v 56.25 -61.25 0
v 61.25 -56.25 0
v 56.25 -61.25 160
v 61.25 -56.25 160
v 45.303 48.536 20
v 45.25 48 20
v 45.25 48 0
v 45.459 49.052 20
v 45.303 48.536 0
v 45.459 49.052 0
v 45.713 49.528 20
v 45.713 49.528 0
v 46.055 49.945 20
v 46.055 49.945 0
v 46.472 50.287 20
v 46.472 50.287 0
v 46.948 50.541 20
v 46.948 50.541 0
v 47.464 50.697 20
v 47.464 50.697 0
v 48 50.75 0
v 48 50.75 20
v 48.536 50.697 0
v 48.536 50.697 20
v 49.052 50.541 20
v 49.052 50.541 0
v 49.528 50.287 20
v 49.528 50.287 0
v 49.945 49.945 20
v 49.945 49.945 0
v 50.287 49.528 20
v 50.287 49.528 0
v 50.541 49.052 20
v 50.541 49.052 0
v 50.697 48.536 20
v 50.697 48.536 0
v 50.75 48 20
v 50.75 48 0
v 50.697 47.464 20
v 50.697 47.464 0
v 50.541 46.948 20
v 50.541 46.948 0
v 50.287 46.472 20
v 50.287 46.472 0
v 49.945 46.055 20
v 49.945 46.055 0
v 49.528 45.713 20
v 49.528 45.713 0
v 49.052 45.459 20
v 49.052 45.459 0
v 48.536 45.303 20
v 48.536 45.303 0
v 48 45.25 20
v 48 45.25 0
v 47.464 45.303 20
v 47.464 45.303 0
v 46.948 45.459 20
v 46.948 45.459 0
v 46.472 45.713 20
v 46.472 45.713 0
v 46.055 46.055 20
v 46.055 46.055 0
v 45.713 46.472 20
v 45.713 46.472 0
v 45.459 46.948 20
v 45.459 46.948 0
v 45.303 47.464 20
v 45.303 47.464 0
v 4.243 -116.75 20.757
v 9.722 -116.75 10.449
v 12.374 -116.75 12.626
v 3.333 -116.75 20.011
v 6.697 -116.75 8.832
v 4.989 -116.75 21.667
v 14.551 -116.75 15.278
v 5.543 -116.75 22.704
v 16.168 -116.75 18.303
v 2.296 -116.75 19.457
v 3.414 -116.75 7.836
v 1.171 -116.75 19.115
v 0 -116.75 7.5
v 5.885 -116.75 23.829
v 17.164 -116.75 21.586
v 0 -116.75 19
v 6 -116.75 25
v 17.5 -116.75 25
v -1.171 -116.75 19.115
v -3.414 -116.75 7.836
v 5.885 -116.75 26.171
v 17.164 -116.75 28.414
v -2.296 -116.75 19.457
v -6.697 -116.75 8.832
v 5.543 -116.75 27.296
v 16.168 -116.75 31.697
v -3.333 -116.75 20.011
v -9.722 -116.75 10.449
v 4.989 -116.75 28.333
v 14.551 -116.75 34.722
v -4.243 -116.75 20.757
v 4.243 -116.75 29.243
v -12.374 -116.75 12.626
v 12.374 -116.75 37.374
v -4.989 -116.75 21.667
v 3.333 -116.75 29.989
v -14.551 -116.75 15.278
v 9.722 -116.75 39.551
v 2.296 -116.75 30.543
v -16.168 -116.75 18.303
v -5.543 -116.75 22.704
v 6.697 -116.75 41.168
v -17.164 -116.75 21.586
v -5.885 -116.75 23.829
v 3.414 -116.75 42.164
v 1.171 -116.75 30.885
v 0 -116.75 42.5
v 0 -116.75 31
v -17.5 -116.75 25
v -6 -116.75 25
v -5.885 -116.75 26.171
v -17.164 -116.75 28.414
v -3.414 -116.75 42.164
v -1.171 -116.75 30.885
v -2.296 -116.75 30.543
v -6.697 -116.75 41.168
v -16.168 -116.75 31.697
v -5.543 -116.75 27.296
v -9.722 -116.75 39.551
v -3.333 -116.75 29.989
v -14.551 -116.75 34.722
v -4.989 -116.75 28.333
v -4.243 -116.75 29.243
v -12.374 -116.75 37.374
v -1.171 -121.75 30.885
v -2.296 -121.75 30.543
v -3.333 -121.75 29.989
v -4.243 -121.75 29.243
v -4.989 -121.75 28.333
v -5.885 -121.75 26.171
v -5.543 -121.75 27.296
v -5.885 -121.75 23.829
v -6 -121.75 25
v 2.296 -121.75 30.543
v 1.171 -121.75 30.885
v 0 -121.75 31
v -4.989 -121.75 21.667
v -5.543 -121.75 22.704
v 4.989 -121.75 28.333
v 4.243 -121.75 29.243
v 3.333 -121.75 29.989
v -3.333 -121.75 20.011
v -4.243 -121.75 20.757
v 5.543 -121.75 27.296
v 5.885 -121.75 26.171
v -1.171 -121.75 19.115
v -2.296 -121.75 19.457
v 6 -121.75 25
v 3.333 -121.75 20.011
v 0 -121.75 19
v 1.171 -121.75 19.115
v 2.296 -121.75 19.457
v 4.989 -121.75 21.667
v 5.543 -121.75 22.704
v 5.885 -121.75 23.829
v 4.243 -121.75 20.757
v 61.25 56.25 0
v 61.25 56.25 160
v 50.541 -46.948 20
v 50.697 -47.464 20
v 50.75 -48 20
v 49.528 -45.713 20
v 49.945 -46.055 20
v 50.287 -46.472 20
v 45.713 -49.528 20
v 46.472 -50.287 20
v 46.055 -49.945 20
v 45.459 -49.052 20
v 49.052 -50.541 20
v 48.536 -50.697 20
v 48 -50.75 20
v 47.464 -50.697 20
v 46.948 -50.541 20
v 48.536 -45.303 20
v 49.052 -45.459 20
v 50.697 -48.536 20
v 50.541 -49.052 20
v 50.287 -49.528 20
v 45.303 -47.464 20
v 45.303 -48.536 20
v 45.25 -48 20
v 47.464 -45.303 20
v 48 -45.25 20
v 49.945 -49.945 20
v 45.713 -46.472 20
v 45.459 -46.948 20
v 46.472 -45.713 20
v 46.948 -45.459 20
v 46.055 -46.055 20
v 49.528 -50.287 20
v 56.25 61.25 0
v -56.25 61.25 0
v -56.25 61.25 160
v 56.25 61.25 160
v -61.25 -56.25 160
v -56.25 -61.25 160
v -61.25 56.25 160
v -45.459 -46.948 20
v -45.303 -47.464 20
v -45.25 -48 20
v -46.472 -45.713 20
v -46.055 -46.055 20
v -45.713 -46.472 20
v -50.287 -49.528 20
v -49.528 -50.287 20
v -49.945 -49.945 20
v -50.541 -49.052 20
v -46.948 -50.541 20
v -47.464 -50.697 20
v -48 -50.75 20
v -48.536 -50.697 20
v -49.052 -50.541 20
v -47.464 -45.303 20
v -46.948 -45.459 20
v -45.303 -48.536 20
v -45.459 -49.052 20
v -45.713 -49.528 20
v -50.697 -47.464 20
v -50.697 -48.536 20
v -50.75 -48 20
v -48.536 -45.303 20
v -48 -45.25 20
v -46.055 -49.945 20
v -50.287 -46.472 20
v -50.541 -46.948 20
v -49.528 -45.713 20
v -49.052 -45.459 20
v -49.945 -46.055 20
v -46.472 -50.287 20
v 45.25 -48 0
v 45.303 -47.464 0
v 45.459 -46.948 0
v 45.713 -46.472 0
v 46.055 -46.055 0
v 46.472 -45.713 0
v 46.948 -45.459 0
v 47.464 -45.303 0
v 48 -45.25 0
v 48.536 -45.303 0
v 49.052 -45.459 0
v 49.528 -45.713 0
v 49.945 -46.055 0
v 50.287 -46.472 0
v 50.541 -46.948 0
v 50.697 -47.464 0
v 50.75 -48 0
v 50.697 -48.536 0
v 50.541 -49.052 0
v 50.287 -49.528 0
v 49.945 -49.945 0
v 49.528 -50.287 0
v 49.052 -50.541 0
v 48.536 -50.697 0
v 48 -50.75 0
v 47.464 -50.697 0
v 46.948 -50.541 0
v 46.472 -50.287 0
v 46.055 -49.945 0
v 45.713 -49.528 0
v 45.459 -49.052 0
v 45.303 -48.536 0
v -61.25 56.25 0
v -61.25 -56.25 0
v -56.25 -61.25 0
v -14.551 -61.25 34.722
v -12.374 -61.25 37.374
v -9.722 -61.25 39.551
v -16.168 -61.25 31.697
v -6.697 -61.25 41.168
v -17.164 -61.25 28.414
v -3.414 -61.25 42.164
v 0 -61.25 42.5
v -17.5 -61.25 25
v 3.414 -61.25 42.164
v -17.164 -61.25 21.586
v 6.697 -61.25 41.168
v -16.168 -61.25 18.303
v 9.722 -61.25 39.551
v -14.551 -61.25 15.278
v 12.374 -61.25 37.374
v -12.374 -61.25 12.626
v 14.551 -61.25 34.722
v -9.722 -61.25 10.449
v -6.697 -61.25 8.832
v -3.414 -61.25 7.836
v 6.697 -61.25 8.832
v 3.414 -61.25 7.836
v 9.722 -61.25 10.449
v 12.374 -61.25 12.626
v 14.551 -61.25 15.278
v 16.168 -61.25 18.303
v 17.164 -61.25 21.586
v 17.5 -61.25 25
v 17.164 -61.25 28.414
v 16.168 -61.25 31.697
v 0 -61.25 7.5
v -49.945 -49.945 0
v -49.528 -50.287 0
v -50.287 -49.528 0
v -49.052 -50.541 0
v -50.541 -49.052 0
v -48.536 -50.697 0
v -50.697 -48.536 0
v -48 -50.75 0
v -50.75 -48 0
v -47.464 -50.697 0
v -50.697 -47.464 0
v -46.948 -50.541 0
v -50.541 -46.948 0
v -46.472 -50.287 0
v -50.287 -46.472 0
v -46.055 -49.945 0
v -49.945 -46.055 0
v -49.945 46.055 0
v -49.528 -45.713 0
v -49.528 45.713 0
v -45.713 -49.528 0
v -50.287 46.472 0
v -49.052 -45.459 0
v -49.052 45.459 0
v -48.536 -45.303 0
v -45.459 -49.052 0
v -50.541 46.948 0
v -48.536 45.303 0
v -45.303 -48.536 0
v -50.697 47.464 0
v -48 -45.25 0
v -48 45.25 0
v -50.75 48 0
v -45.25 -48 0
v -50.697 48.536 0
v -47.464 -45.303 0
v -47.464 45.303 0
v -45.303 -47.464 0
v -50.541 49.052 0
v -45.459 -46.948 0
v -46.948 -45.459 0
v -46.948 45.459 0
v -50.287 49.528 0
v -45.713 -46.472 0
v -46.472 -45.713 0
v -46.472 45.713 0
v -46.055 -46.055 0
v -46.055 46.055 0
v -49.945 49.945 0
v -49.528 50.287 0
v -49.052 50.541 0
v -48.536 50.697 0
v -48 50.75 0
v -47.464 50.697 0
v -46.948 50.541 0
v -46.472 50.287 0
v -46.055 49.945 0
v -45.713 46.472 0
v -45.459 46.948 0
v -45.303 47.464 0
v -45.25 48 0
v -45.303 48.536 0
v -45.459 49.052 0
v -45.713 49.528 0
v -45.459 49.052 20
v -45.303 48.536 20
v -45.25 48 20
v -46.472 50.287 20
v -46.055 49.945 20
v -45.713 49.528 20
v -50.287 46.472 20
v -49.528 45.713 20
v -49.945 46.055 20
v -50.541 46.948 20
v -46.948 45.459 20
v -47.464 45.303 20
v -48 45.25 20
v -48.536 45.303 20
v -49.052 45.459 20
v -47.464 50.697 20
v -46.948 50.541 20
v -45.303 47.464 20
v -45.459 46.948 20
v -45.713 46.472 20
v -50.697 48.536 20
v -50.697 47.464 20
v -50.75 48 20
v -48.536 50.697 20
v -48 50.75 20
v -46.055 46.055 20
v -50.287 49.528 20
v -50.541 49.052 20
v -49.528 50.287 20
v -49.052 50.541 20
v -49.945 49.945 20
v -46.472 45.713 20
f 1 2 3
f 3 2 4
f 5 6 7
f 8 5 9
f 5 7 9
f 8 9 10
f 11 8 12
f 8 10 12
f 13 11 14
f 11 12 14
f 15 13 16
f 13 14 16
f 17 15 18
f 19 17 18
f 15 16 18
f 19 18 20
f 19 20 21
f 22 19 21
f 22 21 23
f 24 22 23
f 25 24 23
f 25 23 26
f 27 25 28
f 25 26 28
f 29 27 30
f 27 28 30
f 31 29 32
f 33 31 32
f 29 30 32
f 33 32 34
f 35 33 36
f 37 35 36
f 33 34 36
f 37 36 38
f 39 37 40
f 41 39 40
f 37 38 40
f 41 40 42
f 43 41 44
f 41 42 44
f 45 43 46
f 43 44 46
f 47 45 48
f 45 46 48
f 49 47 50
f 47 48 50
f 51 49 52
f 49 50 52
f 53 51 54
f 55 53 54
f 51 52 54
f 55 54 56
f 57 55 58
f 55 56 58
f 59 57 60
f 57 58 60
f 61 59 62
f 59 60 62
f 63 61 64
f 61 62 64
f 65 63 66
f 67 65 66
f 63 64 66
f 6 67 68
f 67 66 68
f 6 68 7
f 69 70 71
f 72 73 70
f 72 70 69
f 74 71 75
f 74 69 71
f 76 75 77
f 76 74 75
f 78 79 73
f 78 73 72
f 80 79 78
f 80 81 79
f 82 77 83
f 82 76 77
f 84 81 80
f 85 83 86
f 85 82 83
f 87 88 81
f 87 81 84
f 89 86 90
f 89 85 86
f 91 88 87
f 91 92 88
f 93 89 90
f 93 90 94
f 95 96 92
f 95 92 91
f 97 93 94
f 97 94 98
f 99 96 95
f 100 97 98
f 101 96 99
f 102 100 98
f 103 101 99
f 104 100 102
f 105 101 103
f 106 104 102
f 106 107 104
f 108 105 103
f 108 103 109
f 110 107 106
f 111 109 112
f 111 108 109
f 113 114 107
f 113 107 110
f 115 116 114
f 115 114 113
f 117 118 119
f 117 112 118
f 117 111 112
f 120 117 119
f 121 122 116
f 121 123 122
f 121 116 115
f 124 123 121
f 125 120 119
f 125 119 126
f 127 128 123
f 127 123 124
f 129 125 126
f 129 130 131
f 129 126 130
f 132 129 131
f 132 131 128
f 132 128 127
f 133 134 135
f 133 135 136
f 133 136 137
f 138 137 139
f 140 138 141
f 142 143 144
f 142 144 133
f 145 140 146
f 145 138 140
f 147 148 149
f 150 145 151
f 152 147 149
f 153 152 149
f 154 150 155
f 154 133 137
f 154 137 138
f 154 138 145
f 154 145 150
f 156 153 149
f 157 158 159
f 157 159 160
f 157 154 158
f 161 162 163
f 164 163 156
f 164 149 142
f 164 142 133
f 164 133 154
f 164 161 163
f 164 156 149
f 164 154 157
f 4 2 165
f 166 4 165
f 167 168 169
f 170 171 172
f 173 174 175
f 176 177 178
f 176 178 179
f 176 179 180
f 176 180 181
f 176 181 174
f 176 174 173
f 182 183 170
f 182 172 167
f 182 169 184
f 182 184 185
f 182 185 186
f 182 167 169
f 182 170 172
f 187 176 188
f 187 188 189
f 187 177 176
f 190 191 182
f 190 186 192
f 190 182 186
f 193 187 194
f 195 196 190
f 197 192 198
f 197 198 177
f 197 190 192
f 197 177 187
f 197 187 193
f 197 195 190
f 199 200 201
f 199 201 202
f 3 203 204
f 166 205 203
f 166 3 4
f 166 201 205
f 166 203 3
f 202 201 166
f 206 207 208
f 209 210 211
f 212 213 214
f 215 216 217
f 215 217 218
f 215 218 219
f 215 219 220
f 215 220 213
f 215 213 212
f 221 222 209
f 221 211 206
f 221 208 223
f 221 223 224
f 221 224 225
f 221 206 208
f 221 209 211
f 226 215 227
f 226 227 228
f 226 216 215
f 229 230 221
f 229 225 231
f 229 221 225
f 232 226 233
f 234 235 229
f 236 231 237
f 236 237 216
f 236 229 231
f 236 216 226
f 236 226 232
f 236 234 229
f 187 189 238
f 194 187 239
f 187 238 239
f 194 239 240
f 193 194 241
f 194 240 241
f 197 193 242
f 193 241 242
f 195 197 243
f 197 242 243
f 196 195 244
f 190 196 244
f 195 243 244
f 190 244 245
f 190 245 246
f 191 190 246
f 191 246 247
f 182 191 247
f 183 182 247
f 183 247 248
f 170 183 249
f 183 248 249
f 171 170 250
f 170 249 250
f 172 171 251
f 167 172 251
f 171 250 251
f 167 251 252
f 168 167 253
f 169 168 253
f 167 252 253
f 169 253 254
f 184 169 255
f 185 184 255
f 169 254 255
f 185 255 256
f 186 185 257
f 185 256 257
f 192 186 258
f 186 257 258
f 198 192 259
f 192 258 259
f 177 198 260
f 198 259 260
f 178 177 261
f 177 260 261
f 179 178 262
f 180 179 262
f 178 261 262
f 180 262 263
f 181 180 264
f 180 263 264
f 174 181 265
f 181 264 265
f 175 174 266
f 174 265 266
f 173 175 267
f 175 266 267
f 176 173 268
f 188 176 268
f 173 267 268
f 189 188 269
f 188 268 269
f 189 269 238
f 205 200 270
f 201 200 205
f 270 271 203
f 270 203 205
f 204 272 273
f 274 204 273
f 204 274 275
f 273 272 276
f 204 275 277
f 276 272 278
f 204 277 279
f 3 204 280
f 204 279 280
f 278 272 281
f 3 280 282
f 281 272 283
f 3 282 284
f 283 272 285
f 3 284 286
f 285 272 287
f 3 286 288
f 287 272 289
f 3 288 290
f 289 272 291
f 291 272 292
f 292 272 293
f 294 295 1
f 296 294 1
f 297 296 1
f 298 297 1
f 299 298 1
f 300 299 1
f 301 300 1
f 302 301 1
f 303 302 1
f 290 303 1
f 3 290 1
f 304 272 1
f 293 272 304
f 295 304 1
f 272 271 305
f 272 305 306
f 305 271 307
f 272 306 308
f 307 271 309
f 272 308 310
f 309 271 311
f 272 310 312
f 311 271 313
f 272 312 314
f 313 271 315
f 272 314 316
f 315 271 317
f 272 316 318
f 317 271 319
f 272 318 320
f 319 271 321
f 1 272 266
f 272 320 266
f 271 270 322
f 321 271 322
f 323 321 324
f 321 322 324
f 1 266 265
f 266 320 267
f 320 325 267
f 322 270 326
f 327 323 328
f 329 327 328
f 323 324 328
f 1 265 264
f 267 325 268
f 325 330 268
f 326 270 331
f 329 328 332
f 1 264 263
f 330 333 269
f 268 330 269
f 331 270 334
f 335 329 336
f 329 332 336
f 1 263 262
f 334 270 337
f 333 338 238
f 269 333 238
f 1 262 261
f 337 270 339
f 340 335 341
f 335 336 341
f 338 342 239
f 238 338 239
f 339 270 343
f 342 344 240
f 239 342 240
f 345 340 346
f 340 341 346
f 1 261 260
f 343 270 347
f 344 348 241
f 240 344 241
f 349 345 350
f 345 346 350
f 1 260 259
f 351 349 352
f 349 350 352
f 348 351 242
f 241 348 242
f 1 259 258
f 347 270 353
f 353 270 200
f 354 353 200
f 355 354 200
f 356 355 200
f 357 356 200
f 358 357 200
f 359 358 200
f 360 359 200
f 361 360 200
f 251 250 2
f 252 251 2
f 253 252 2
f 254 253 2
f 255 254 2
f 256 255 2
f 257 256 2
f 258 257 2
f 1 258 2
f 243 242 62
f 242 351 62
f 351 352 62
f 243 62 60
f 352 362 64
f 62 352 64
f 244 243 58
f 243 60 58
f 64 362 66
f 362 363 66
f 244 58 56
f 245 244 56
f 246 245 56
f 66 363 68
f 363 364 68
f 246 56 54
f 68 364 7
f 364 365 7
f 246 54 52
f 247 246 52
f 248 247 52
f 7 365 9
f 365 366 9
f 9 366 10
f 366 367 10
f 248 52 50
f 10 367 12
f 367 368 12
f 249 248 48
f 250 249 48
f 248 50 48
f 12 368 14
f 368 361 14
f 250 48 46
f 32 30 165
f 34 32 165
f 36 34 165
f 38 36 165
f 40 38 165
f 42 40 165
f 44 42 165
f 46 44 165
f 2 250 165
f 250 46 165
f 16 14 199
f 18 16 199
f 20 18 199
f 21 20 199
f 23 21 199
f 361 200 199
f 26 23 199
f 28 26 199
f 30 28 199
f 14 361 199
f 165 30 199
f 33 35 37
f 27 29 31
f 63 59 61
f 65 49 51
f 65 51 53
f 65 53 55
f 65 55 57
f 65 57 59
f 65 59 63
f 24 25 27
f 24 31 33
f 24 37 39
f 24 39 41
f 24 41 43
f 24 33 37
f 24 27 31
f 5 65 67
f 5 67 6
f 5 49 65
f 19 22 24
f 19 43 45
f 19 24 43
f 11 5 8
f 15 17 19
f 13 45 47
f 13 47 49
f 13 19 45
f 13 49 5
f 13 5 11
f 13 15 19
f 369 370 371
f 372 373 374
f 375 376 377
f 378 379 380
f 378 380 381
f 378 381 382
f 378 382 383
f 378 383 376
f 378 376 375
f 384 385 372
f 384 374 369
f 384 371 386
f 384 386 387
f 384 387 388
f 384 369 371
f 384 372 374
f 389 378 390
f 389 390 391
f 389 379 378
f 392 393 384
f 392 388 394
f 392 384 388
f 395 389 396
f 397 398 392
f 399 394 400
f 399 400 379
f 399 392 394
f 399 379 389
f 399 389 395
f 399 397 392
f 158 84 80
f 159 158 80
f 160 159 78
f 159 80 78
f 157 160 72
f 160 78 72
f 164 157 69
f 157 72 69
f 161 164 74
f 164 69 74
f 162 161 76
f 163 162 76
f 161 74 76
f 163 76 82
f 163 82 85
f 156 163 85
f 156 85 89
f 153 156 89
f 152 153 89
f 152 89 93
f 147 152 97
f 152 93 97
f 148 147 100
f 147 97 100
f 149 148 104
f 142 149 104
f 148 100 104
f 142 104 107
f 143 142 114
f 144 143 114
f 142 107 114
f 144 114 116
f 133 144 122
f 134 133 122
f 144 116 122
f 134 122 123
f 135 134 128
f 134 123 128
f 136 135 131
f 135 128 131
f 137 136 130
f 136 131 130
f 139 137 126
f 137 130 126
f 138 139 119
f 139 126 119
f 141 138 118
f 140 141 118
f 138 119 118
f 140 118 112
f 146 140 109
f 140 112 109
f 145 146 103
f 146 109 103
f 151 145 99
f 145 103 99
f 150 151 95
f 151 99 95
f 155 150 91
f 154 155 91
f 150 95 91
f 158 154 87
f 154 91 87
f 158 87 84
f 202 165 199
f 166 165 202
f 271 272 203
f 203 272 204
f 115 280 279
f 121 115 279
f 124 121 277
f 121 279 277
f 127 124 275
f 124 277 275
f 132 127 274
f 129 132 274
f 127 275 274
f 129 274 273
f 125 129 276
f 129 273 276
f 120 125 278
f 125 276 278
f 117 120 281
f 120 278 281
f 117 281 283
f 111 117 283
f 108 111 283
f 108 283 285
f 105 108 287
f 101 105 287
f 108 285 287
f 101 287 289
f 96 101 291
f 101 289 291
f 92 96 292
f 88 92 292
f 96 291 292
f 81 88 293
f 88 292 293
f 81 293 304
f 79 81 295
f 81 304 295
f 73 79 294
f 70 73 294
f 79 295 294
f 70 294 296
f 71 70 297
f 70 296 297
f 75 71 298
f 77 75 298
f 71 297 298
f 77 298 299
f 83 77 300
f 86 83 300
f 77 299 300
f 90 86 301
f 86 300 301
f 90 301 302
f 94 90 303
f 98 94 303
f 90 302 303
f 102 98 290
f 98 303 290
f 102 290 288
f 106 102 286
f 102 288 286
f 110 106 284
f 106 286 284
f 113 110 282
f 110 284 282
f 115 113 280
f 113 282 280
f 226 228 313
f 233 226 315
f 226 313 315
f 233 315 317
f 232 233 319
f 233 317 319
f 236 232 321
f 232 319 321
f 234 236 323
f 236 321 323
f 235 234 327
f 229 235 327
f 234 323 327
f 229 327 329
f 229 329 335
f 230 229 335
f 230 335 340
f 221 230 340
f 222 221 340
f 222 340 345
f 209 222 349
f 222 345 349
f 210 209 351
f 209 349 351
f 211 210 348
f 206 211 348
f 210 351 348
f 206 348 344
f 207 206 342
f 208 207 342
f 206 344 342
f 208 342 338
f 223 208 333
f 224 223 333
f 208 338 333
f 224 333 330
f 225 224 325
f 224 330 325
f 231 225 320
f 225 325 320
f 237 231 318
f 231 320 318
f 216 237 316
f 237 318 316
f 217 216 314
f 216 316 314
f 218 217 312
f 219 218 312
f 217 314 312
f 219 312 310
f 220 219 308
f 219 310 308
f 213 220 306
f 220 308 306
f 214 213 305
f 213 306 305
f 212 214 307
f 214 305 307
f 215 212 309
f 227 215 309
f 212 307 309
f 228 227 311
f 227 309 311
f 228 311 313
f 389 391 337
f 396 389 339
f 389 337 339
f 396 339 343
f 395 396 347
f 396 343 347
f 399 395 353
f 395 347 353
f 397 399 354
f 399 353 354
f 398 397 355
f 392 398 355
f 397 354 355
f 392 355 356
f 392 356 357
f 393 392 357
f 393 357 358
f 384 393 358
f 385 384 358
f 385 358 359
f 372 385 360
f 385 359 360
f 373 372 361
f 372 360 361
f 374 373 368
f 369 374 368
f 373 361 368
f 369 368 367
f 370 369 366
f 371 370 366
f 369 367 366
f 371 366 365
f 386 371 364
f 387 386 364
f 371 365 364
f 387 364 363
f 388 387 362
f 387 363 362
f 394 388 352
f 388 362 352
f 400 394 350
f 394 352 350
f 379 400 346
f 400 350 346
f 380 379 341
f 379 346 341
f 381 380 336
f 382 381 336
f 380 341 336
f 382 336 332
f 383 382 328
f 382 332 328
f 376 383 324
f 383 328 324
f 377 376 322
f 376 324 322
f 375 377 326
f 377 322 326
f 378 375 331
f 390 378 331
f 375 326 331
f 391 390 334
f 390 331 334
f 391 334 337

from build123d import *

# Parameters (mm, degrees)
SKETCH_6_W          = 122.5
SKETCH_6_H          = 122.5
EXTRUDE_5_DEPTH     = 160
SKETCH_7_R          = 17.5
EXTRUDE_6_DEPTH     = 55.5
SKETCH_8_R          = 6
EXTRUDE_7_DEPTH     = 5
CHAMFER_1_SIZE      = 5
SKETCH_9_R          = 2.75
CUT_EXTRUDE_1_DEPTH = 20


with BuildPart() as part:
    # 草图6 → 凸台-拉伸5 (new body)
    with BuildSketch(Plane.XY):
        Rectangle(SKETCH_6_W, SKETCH_6_H)
    extrude(amount=EXTRUDE_5_DEPTH)

    # 草图7 → 凸台-拉伸6 (add)
    with BuildSketch(Plane.XZ.offset(61.25)):
        with Locations(Location((0, 25, 0), (0, 0, 90))):
            Circle(SKETCH_7_R)
    extrude(amount=EXTRUDE_6_DEPTH)

    # 草图8 → 凸台-拉伸7 (add)
    with BuildSketch(Plane.XZ.offset(116.75)):
        with Locations(Location((0, 25, 0), (0, 0, 270))):
            Circle(SKETCH_8_R)
    extrude(amount=EXTRUDE_7_DEPTH)

    # 倒角1
    chamfer_1_edges = [part.edges().sort_by_distance(p)[0] for p in [
        (-61.25, 61.25, 80),
        (61.25, 61.25, 80),
        (61.25, -61.25, 80),
        (-61.25, -61.25, 80),
    ]]
    chamfer(chamfer_1_edges, length=CHAMFER_1_SIZE)

    # 草图9 → 切除-拉伸1 (cut)
    with BuildSketch(Plane(origin=(0, 0, 0), x_dir=(-1, 0, 0), z_dir=(0, 0, -1))):
        with Locations((-48, 48)):
            Circle(SKETCH_9_R)
        with Locations((48, 48)):
            Circle(SKETCH_9_R)
        with Locations((48, -48)):
            Circle(SKETCH_9_R)
        with Locations((-48, -48)):
            Circle(SKETCH_9_R)
    extrude(amount=-CUT_EXTRUDE_1_DEPTH, mode=Mode.SUBTRACT)


solid = part.part
